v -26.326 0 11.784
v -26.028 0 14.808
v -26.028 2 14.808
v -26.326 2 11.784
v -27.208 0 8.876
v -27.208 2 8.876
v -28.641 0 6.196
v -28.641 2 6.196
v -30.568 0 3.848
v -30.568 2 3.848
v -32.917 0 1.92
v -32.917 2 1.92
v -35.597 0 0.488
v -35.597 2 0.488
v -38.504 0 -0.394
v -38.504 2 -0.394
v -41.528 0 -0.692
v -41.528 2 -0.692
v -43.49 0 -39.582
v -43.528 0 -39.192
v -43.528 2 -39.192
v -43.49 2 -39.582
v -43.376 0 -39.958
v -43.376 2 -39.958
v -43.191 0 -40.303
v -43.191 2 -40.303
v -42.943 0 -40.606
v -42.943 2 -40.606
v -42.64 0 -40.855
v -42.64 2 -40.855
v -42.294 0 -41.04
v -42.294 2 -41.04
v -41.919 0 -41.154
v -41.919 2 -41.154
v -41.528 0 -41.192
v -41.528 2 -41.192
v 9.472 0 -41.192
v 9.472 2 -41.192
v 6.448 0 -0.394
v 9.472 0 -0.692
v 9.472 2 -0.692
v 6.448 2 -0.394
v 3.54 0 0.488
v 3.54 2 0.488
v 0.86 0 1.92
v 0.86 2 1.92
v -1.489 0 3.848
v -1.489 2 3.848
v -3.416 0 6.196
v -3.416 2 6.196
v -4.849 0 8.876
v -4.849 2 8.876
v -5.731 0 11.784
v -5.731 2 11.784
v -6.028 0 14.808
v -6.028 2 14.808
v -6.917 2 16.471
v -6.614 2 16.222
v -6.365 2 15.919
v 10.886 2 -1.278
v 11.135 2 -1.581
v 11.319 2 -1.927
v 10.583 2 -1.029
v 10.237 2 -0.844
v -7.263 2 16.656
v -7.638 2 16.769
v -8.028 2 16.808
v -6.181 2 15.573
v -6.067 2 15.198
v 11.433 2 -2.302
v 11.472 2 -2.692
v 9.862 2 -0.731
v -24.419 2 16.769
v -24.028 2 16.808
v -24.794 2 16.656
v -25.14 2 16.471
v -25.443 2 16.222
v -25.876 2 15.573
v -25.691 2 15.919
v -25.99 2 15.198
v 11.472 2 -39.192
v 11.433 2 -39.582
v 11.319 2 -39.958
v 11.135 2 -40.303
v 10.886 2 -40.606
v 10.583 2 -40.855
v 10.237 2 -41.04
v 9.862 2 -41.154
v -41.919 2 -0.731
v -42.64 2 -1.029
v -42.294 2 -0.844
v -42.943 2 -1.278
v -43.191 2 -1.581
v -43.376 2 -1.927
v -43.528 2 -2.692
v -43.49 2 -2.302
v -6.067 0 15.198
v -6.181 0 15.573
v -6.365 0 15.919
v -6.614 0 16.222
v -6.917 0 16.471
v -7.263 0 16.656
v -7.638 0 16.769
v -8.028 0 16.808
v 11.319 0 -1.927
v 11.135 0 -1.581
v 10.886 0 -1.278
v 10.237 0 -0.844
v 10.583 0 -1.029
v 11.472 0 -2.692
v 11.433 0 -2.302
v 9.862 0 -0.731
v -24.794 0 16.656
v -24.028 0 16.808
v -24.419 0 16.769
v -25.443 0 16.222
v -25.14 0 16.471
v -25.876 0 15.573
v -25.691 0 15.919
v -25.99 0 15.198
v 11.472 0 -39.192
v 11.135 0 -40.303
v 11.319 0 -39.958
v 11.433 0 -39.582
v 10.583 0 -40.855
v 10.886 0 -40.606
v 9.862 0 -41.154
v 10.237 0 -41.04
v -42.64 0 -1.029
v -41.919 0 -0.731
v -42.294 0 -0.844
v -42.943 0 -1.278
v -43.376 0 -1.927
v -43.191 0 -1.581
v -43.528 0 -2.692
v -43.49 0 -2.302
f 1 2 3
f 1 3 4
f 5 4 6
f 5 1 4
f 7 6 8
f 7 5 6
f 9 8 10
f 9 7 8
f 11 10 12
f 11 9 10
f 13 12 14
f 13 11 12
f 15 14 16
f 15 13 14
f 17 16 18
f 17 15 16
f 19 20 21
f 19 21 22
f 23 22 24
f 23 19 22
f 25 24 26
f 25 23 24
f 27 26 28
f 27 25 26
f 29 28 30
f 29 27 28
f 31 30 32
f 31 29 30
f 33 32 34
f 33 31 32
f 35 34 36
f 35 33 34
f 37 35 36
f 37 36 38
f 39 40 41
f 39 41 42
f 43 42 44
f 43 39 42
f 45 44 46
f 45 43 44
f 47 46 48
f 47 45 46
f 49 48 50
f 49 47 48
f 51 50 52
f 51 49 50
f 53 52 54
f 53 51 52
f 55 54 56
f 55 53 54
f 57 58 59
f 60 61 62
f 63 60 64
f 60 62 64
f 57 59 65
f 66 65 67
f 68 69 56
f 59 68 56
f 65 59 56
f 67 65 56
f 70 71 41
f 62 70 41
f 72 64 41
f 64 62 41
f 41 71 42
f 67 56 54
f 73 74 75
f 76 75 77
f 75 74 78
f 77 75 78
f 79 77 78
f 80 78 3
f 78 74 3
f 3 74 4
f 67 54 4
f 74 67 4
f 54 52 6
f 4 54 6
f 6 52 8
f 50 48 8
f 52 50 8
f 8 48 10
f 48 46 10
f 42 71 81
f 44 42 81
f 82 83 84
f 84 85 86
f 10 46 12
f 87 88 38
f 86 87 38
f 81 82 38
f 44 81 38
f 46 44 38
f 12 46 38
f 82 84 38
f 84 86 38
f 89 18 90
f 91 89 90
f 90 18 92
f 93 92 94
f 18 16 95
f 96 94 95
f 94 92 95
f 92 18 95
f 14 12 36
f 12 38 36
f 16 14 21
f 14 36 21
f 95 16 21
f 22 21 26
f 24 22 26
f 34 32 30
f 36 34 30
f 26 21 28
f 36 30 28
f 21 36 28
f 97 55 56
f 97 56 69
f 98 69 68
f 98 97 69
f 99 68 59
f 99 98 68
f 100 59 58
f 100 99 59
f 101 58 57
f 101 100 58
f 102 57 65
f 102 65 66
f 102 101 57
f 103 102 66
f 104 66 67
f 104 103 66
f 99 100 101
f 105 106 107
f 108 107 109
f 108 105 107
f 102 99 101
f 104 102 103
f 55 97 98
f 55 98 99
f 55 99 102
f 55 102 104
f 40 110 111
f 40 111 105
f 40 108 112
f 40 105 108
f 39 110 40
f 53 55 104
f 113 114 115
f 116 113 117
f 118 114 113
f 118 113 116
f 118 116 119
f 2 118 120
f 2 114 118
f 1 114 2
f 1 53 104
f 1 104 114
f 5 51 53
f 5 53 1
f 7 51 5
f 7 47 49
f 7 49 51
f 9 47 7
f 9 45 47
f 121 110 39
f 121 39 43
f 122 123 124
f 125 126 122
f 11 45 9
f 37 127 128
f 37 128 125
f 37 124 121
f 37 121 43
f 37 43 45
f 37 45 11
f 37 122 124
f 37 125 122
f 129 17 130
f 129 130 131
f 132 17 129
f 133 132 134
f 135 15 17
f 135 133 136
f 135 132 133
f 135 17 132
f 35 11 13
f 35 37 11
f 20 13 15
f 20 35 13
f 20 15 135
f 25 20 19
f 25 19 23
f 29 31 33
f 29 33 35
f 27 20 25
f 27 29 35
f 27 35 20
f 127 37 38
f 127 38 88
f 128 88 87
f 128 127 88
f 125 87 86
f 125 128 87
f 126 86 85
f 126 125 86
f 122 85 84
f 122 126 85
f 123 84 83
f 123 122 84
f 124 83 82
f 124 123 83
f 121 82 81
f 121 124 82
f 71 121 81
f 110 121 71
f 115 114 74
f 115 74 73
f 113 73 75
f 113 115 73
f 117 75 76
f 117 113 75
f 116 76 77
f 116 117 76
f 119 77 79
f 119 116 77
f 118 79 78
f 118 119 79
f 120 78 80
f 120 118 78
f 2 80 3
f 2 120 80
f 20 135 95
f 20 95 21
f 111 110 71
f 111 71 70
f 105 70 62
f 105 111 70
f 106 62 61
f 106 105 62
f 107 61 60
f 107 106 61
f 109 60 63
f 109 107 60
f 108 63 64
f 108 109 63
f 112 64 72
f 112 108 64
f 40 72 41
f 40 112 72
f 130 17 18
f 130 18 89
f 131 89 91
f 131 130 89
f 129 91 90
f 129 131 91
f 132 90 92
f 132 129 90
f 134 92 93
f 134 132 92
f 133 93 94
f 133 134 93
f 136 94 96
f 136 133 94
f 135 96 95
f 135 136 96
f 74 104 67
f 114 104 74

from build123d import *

# Parameters (mm, degrees)
SALIENTE_EXTRUIR1_DEPTH = 2


with BuildPart() as part:
    # Croquis1 → Saliente-Extruir1 (new body)
    with BuildSketch(Plane(origin=(0, 0, 0), x_dir=(1, 0, 0), z_dir=(0, 1, 0))):
        with BuildLine():
            Line((-41.528381643, 41.192203833), (9.471618357, 41.192203833))
            ThreePointArc((9.471618357, 41.192203833), (10.88583192, 40.606417395), (11.471618357, 39.192203833))
            Line((11.471618357, 39.192203833), (11.471618357, 2.692203833))
            ThreePointArc((11.471618357, 2.692203833), (10.88583192, 1.27799027), (9.471618357, 0.692203833))
            ThreePointArc((9.471618357, 0.692203833), (-1.488536751, -3.847641059), (-6.028381643, -14.807796167))
            ThreePointArc((-6.028381643, -14.807796167), (-6.61416808, -16.22200973), (-8.028381643, -16.807796167))
            Line((-8.028381643, -16.807796167), (-24.028381643, -16.807796167))
            ThreePointArc((-24.028381643, -16.807796167), (-25.442595205, -16.22200973), (-26.028381643, -14.807796167))
            ThreePointArc((-26.028381643, -14.807796167), (-30.568226534, -3.847641059), (-41.528381643, 0.692203833))
            ThreePointArc((-41.528381643, 0.692203833), (-42.942595205, 1.27799027), (-43.528381643, 2.692203833))
            Line((-43.528381643, 2.692203833), (-43.528381643, 39.192203833))
            ThreePointArc((-43.528381643, 39.192203833), (-42.942595205, 40.606417395), (-41.528381643, 41.192203833))
        make_face()
    extrude(amount=SALIENTE_EXTRUIR1_DEPTH)


solid = part.part
